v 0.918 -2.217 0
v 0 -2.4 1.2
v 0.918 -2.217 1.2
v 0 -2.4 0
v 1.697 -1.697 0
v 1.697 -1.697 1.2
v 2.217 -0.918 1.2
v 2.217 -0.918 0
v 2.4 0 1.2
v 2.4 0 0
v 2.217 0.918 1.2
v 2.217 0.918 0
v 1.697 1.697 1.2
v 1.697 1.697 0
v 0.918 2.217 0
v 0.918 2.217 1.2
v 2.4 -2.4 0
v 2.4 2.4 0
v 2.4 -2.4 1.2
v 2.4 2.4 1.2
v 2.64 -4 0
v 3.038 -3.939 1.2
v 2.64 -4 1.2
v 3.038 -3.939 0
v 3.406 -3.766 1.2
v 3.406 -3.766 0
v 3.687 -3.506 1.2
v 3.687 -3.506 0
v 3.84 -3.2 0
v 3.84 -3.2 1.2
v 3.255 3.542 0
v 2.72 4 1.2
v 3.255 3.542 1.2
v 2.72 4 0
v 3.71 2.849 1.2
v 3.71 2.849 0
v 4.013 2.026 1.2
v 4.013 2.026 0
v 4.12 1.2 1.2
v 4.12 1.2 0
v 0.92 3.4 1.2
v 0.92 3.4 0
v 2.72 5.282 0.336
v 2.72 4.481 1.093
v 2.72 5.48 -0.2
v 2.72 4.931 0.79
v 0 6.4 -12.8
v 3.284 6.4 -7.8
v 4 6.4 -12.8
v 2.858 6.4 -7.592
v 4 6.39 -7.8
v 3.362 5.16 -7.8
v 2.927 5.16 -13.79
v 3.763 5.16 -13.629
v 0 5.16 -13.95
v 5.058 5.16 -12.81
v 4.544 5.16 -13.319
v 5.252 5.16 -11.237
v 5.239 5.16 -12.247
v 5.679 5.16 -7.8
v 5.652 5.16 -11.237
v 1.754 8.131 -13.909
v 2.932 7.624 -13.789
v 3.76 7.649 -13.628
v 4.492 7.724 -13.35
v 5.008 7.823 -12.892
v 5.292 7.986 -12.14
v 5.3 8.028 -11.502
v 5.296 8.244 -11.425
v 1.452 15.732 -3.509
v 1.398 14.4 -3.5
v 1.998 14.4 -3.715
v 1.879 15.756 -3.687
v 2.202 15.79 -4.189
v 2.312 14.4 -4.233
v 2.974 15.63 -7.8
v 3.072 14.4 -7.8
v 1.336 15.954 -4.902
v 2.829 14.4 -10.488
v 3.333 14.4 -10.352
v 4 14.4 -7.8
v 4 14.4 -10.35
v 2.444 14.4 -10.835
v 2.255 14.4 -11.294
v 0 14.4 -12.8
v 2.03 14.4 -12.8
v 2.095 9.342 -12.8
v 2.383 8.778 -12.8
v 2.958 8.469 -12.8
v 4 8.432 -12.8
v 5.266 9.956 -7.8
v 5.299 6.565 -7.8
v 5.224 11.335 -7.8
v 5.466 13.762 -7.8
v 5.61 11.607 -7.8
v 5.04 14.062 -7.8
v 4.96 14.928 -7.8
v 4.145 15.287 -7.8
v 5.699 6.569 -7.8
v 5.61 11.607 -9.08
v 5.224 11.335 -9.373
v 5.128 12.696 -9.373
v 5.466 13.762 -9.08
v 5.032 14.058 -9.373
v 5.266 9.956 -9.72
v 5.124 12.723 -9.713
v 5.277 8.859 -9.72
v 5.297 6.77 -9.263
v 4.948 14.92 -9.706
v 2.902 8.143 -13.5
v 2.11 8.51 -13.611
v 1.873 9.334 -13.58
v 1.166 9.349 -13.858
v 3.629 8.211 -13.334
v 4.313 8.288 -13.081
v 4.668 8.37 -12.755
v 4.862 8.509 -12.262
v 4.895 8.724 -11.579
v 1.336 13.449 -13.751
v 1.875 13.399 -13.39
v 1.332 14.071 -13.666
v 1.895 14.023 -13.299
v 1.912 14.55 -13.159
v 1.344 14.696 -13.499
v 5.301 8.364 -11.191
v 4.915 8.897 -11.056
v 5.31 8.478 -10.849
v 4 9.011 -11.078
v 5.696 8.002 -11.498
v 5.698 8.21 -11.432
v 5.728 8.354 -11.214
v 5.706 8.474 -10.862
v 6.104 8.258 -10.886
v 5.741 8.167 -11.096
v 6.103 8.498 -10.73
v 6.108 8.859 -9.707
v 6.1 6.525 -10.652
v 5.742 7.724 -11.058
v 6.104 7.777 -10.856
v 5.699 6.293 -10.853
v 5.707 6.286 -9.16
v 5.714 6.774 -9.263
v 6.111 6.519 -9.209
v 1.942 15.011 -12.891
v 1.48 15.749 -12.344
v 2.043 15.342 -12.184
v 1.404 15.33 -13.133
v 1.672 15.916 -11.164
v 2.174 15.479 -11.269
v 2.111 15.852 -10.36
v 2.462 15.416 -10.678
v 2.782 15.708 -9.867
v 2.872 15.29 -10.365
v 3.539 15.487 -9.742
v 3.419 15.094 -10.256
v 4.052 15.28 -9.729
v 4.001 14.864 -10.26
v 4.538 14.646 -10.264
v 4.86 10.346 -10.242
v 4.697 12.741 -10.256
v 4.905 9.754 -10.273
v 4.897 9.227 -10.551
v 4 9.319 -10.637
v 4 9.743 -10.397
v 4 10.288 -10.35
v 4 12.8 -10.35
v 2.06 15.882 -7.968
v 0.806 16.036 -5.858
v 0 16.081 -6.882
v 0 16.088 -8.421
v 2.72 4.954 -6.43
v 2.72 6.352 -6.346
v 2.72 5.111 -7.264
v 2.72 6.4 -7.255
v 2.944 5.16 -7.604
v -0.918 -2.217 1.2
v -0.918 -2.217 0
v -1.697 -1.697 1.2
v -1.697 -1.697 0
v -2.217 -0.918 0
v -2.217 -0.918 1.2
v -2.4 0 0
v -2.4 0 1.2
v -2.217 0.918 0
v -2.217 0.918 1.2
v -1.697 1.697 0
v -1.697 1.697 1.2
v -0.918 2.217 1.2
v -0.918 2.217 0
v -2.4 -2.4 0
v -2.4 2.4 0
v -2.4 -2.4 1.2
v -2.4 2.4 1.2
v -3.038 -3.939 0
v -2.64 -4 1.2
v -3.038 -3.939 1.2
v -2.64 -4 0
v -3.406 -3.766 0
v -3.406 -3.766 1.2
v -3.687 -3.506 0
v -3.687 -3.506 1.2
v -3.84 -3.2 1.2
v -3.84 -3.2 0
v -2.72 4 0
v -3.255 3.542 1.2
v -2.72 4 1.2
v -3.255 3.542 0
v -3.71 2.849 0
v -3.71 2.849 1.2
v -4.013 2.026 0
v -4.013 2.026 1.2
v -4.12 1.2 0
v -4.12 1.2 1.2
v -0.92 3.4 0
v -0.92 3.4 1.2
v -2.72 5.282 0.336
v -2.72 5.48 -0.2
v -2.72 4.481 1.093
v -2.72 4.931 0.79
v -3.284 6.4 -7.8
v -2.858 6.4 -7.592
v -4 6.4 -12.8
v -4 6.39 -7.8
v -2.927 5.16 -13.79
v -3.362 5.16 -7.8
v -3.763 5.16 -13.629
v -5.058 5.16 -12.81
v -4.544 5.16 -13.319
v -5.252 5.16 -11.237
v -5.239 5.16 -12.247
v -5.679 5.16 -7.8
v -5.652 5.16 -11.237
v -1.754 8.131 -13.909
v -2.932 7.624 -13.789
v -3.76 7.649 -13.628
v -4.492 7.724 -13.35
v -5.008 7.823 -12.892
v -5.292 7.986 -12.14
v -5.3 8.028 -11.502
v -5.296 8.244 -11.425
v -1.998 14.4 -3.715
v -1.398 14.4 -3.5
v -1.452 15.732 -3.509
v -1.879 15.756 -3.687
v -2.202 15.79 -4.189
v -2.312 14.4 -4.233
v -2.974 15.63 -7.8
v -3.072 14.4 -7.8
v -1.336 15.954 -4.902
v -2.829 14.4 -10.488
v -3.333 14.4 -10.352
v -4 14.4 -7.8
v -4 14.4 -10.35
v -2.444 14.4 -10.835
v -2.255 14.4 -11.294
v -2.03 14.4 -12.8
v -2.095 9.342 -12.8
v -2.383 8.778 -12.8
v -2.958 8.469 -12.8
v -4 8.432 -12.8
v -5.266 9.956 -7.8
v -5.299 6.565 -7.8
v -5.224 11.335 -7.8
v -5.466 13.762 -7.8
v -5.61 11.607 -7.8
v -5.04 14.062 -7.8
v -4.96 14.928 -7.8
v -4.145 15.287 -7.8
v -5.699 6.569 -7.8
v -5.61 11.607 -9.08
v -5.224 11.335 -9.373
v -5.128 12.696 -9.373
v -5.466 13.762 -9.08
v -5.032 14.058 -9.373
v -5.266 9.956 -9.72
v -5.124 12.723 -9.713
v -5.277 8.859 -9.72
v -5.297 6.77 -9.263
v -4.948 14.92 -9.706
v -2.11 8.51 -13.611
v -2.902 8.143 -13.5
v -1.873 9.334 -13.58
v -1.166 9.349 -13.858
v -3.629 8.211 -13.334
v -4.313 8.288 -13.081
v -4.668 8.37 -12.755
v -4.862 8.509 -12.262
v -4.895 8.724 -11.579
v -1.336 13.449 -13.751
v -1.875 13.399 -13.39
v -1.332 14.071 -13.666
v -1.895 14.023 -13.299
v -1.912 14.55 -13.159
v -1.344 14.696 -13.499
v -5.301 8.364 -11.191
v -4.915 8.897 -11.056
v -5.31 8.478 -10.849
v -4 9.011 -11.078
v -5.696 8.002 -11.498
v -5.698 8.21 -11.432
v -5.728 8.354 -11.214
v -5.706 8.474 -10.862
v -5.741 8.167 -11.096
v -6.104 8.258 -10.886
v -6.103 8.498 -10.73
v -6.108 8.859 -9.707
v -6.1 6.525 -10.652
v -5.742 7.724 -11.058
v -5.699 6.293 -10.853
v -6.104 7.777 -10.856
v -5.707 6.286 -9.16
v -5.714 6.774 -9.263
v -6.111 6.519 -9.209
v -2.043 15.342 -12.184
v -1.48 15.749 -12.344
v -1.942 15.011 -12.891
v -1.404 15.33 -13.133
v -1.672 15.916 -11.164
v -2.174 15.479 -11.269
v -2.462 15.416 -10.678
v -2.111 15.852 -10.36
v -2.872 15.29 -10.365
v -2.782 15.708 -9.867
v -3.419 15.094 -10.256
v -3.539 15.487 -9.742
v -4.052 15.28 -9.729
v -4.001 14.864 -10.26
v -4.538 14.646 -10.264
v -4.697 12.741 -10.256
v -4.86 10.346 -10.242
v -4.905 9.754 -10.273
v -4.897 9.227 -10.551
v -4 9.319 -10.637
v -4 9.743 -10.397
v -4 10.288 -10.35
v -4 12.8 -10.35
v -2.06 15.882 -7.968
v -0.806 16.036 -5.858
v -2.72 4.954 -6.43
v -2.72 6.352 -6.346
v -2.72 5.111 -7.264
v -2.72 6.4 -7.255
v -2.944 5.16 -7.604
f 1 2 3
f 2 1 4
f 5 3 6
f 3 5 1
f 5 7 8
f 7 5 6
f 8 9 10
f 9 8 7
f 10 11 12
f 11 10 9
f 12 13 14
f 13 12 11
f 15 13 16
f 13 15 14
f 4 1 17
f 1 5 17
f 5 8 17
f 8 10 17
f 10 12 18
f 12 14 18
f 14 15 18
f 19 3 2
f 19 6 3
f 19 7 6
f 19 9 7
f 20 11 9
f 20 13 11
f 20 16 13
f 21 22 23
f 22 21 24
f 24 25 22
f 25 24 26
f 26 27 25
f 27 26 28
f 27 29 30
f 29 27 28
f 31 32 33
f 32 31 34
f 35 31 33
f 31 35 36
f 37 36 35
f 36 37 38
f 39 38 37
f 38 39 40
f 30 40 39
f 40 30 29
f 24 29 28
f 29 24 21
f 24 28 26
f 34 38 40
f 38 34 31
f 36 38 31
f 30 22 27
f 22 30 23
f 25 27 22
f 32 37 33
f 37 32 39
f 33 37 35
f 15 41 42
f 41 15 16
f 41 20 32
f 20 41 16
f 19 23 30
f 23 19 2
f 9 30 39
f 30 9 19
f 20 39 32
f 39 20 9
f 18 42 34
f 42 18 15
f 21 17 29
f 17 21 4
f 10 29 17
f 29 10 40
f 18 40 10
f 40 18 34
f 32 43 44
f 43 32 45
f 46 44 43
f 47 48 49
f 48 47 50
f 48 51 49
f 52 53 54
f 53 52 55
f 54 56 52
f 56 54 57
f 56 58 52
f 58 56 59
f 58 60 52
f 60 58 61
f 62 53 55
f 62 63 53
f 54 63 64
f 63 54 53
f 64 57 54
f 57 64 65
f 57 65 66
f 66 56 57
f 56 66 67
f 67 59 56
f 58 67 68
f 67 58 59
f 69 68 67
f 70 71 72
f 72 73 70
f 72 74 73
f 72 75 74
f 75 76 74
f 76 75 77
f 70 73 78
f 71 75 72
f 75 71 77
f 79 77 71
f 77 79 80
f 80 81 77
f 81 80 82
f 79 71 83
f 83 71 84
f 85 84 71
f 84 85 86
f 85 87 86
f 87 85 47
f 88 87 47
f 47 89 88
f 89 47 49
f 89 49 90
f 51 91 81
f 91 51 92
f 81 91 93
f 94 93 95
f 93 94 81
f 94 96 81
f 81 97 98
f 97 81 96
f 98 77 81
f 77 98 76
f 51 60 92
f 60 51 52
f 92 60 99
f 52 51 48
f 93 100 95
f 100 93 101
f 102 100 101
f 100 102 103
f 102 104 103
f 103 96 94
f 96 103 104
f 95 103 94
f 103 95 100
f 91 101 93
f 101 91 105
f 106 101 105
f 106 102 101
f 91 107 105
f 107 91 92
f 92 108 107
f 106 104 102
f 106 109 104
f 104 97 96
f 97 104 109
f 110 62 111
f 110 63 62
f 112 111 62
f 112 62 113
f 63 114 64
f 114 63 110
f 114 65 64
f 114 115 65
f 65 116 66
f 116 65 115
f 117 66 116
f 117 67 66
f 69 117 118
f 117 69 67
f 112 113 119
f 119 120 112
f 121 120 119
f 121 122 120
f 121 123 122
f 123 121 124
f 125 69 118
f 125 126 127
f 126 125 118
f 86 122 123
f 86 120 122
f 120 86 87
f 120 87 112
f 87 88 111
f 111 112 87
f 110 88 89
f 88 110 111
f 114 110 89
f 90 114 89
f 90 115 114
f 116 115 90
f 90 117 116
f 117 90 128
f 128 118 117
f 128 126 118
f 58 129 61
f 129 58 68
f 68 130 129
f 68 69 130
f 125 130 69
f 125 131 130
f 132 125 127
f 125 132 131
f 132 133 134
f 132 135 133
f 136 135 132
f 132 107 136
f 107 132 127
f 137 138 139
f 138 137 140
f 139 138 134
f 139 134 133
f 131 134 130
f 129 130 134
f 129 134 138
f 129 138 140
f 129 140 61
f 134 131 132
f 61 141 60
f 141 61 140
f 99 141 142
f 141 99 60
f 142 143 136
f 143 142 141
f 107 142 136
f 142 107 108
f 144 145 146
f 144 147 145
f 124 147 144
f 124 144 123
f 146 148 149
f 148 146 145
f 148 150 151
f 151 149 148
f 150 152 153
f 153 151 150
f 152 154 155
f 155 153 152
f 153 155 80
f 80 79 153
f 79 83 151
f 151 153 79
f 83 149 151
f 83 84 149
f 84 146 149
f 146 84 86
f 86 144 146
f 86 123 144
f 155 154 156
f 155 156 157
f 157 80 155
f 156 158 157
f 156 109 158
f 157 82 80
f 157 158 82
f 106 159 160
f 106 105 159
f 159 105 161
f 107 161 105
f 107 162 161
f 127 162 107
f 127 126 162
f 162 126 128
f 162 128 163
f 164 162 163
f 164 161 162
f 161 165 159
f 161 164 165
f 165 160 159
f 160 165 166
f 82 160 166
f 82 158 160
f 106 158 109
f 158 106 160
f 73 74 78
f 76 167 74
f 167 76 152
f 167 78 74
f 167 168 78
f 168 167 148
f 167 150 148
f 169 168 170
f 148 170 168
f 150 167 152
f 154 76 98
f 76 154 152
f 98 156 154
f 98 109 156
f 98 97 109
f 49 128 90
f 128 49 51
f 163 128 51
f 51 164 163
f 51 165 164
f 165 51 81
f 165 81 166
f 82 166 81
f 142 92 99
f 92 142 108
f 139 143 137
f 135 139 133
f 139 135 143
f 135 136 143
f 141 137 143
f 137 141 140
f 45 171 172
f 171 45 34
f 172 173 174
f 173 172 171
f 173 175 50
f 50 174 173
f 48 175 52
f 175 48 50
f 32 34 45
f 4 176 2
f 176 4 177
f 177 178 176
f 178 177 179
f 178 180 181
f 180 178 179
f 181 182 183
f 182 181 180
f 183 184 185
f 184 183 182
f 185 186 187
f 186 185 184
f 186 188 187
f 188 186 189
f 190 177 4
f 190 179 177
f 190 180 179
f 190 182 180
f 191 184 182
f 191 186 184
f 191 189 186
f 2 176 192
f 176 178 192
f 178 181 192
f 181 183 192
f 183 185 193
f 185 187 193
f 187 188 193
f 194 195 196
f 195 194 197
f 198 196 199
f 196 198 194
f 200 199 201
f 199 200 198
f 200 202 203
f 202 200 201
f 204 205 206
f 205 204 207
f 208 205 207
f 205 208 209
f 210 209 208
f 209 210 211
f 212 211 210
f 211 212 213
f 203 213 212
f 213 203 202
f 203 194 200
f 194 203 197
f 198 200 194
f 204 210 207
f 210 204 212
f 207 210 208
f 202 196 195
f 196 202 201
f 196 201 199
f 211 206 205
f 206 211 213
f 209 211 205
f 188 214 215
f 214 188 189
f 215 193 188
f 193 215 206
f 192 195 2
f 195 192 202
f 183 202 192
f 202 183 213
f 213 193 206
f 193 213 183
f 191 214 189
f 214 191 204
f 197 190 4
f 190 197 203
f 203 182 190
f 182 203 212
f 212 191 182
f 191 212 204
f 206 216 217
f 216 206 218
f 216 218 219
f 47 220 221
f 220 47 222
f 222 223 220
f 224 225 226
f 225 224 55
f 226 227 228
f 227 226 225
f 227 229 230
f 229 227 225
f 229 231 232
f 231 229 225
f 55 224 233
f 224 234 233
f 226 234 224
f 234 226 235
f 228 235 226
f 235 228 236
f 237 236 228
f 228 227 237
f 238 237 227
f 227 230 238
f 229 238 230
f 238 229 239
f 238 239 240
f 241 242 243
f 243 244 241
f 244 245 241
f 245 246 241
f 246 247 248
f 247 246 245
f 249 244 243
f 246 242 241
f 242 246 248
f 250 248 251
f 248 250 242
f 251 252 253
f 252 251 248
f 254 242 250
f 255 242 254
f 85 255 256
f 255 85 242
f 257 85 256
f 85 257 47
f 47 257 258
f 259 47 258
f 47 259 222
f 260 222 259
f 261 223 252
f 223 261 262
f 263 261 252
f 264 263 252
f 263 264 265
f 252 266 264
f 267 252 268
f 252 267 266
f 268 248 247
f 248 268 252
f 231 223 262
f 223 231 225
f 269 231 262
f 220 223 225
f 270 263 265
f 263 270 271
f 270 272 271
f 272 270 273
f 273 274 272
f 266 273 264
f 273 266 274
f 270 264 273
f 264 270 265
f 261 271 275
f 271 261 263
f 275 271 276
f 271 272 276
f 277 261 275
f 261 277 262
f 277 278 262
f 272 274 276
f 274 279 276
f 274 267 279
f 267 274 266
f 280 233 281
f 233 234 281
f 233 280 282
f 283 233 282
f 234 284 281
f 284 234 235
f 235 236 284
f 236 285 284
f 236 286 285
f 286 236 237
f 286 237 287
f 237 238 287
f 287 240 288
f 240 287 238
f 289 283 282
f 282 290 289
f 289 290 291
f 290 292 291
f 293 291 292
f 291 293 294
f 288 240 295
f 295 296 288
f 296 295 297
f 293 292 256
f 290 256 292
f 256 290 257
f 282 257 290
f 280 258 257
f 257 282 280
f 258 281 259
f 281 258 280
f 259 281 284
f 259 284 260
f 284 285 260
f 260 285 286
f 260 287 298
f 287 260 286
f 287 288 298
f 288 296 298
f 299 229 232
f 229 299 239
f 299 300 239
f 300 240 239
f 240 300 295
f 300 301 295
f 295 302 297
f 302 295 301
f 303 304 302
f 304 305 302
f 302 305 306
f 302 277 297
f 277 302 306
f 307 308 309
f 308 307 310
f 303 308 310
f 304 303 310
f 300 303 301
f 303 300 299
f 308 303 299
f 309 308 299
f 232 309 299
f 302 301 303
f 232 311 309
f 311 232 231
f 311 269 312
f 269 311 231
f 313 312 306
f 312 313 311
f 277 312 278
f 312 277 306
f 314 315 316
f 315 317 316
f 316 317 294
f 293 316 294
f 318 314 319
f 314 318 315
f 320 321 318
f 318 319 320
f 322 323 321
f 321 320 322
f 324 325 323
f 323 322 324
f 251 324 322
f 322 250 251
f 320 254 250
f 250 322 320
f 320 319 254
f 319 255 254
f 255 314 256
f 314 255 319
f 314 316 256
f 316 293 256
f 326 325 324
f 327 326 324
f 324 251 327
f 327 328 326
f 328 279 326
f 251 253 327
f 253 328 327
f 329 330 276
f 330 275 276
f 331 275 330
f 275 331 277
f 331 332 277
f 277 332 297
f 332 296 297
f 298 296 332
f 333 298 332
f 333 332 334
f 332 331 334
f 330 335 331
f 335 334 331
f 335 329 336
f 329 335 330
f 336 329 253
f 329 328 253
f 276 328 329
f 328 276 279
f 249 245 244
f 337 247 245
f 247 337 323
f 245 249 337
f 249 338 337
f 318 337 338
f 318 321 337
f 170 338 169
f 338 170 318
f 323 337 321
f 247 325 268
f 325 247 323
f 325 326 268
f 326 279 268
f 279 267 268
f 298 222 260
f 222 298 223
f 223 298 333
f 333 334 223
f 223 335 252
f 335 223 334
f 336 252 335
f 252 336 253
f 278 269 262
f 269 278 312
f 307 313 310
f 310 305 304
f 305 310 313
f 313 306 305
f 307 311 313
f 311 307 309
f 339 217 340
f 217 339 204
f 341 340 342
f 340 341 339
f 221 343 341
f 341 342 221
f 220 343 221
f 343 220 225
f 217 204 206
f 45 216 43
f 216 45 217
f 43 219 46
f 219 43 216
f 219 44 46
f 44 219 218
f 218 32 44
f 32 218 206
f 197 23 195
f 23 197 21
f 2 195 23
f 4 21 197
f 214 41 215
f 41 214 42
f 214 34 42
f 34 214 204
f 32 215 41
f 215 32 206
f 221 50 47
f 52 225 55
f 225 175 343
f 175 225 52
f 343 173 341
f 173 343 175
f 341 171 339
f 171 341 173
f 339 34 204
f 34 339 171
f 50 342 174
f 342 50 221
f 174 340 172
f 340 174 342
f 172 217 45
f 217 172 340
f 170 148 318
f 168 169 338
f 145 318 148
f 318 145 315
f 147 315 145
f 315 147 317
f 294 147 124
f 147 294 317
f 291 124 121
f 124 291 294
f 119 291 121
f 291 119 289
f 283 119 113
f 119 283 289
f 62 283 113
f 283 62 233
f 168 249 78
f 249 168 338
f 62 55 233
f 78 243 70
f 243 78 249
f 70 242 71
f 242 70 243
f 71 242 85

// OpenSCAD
use <../lib.scad>
use <../p/1-4cylo.scad>
use <../p/rect2p.scad>
use <s/37822s01.scad>
function ldraw_lib__37822() = [
// 0 Minifig Baby Carrier
// 0 Name: 37822.dat
// 0 Author: Philippe Hurbain [Philo]
// 0 !LDRAW_ORG Part UPDATE 2023-04
// 0 !LICENSE Licensed under CC BY 4.0 : see CAreadme.txt
// 
// 0 BFC CERTIFY CCW
  [0,"BFC","CERTIFY"],
  [0,"BFC","CCW"],
// 
// 0 !CATEGORY Minifig Neckwear
// 
// 0 !HISTORY 2023-04-27 {LEGO Instructions App} Original part shape
// 0 !HISTORY 2023-04-30 [Philo] File preparation for LDraw Parts Tracker
// 0 !HISTORY 2023-08-25 [OrionP] Official Update 2023-04
// 
// 
// 1 16 0 0 0 1 0 0 0 1 0 0 0 1 s\37822s01.dat
  [1,16,0,0,0,1,0,0,0,1,0,0,0,1, ldraw_lib__s__37822s01()],
// 1 16 0 0 0 -1 0 0 0 1 0 0 0 1 s\37822s01.dat
  [1,16,0,0,0,-1,0,0,0,1,0,0,0,1, ldraw_lib__s__37822s01()],
// 
// 1 16 6.799 0.5 10.7 0 -13.598 0 0 0 -3.5 3 0 -0.7 1-4cylo.dat
  [1,16,6.799,0.5,10.7,0,-13.598,0,0,0,-3.5,3,0,-0.7, ldraw_lib__1_4cylo()],
// 1 16 0 -1.5 -10 -6.6 0 0 0 0 1.5 0 1 0 rect2p.dat
  [1,16,0,-1.5,-10,-6.6,0,0,0,0,1.5,0,1,0, ldraw_lib__rect2p()],
// 3 16 0 -3 -6 -6.6 -3 -10 6.6 -3 -10
  [3,16,0,-3,-6,-6.6,-3,-10,6.6,-3,-10],
// 3 16 0 0 -6 6.6 0 -10 -6.6 0 -10
  [3,16,0,0,-6,6.6,0,-10,-6.6,0,-10],
// 1 16 0 -1.5 8.5 -2.3 0 0 0 0 1.5 0 1 0 rect2p.dat
  [1,16,0,-1.5,8.5,-2.3,0,0,0,0,1.5,0,1,0, ldraw_lib__rect2p()],
// 4 16 2.3 0 8.5 -2.3 0 8.5 -6.799 0 10 6.799 0 10
  [4,16,2.3,0,8.5,-2.3,0,8.5,-6.799,0,10,6.799,0,10],
// 4 16 -2.3 -3 8.5 2.3 -3 8.5 6.799 -3 10 -6.799 -3 10
  [4,16,-2.3,-3,8.5,2.3,-3,8.5,6.799,-3,10,-6.799,-3,10],
// 3 16 -7.146 18.981 16 7.146 18.981 16 0 32 16
  [3,16,-7.146,18.981,16,7.146,18.981,16,0,32,16],
// 3 16 8.405 19.5 12.9 -8.405 19.5 12.9 0 34.875 12.9
  [3,16,8.405,19.5,12.9,-8.405,19.5,12.9,0,34.875,12.9],
// 4 16 -8.405 19.5 12.9 8.405 19.5 12.9 7.36 19.009 12.9 -7.36 19.009 12.9
  [4,16,-8.405,19.5,12.9,8.405,19.5,12.9,7.36,19.009,12.9,-7.36,19.009,12.9],
// 4 16 -6.799 18.161 12.777 -7.36 19.009 12.9 7.36 19.009 12.9 6.799 18.161 12.777
  [4,16,-6.799,18.161,12.777,-7.36,19.009,12.9,7.36,19.009,12.9,6.799,18.161,12.777],
// 4 16 6.799 16.075 12.384 -6.799 16.075 12.384 -6.799 18.161 12.777 6.799 18.161 12.777
  [4,16,6.799,16.075,12.384,-6.799,16.075,12.384,-6.799,18.161,12.777,6.799,18.161,12.777],
// 4 16 -6.799 16.075 12.384 6.799 16.075 12.384 6.799 0 10 -6.799 0 10
  [4,16,-6.799,16.075,12.384,6.799,16.075,12.384,6.799,0,10,-6.799,0,10],
// 2 24 -6.799 0 10 6.799 0 10
  [2,24,-6.799,0,10,6.799,0,10],
// 4 16 -7.146 18.981 16 -6.799 18.137 16 6.799 18.137 16 7.146 18.981 16
  [4,16,-7.146,18.981,16,-6.799,18.137,16,6.799,18.137,16,7.146,18.981,16],
// 4 16 6.799 18.137 16 -6.799 18.137 16 -6.799 15.866 15.88 6.799 15.866 15.88
  [4,16,6.799,18.137,16,-6.799,18.137,16,-6.799,15.866,15.88,6.799,15.866,15.88],
// 4 16 6.799 0.5 13.7 6.799 15.866 15.88 -6.799 15.866 15.88 -6.8 0.5 13.7
  [4,16,6.799,0.5,13.7,6.799,15.866,15.88,-6.799,15.866,15.88,-6.8,0.5,13.7],
// 5 24 3.51 32.832 38.325 -3.51 32.832 38.325 -3.359 33.748 36.741 -3.699 30.86 39.373
  [5,24,3.51,32.832,38.325,-3.51,32.832,38.325,-3.359,33.748,36.741,-3.699,30.86,39.373],
// 3 16 0 21.052 40.221 4.179 27.911 39.79 -4.179 27.911 39.79
  [3,16,0,21.052,40.221,4.179,27.911,39.79,-4.179,27.911,39.79],
// 3 16 2.016 14.645 40.09 0 17.204 40.203 -2.016 14.645 40.09
  [3,16,2.016,14.645,40.09,0,17.204,40.203,-2.016,14.645,40.09],
// 4 16 4.179 27.911 39.79 3.699 30.86 39.373 -3.699 30.86 39.373 -4.179 27.911 39.79
  [4,16,4.179,27.911,39.79,3.699,30.86,39.373,-3.699,30.86,39.373,-4.179,27.911,39.79],
// 4 16 3.699 30.86 39.373 3.51 32.832 38.325 -3.51 32.832 38.325 -3.699 30.86 39.373
  [4,16,3.699,30.86,39.373,3.51,32.832,38.325,-3.51,32.832,38.325,-3.699,30.86,39.373],
// 4 16 3.51 32.832 38.325 3.359 33.748 36.741 -3.359 33.748 36.741 -3.51 32.832 38.325
  [4,16,3.51,32.832,38.325,3.359,33.748,36.741,-3.359,33.748,36.741,-3.51,32.832,38.325],
// 4 16 3.359 33.748 36.741 3.329 34.166 35.177 -3.329 34.166 35.177 -3.359 33.748 36.741
  [4,16,3.359,33.748,36.741,3.329,34.166,35.177,-3.329,34.166,35.177,-3.359,33.748,36.741],
// 4 16 3.329 34.166 35.177 3.339 34.377 33.623 -3.339 34.377 33.623 -3.329 34.166 35.177
  [4,16,3.329,34.166,35.177,3.339,34.377,33.623,-3.339,34.377,33.623,-3.329,34.166,35.177],
// 4 16 3.339 34.377 33.623 2.916 34.646 23.372 -2.916 34.646 23.372 -3.339 34.377 33.623
  [4,16,3.339,34.377,33.623,2.916,34.646,23.372,-2.916,34.646,23.372,-3.339,34.377,33.623],
// 4 16 2.916 34.646 23.372 4.385 34.772 20.327 -4.385 34.772 20.327 -2.916 34.646 23.372
  [4,16,2.916,34.646,23.372,4.385,34.772,20.327,-4.385,34.772,20.327,-2.916,34.646,23.372],
// 4 16 3.34 12.256 39.884 2.016 14.645 40.09 -2.016 14.645 40.09 -3.34 12.256 39.884
  [4,16,3.34,12.256,39.884,2.016,14.645,40.09,-2.016,14.645,40.09,-3.34,12.256,39.884],
// 5 24 4.179 27.911 39.79 -4.179 27.911 39.79 3.699 30.86 39.373 0 21.052 40.221
  [5,24,4.179,27.911,39.79,-4.179,27.911,39.79,3.699,30.86,39.373,0,21.052,40.221],
// 5 24 3.699 30.86 39.373 -3.699 30.86 39.373 3.51 32.832 38.325 4.179 27.911 39.79
  [5,24,3.699,30.86,39.373,-3.699,30.86,39.373,3.51,32.832,38.325,4.179,27.911,39.79],
// 5 24 3.359 33.748 36.741 -3.359 33.748 36.741 3.329 34.166 35.177 3.51 32.832 38.325
  [5,24,3.359,33.748,36.741,-3.359,33.748,36.741,3.329,34.166,35.177,3.51,32.832,38.325],
// 5 24 3.329 34.166 35.177 -3.329 34.166 35.177 3.339 34.377 33.623 3.359 33.748 36.741
  [5,24,3.329,34.166,35.177,-3.329,34.166,35.177,3.339,34.377,33.623,3.359,33.748,36.741],
// 5 24 3.339 34.377 33.623 -3.339 34.377 33.623 2.916 34.646 23.372 3.329 34.166 35.177
  [5,24,3.339,34.377,33.623,-3.339,34.377,33.623,2.916,34.646,23.372,3.329,34.166,35.177],
// 5 24 2.916 34.646 23.372 -2.916 34.646 23.372 4.385 34.772 20.327 3.339 34.377 33.623
  [5,24,2.916,34.646,23.372,-2.916,34.646,23.372,4.385,34.772,20.327,3.339,34.377,33.623],
// 5 24 2.016 14.645 40.09 -2.016 14.645 40.09 0 17.204 40.203 3.34 12.256 39.884
  [5,24,2.016,14.645,40.09,-2.016,14.645,40.09,0,17.204,40.203,3.34,12.256,39.884],
// 3 16 4.385 34.772 20.327 0 34.875 12.9 -4.385 34.772 20.327
  [3,16,4.385,34.772,20.327,0,34.875,12.9,-4.385,34.772,20.327],
// 4 16 3.34 12.256 39.884 -3.34 12.256 39.884 -3.629 8.772 39.33 3.629 8.772 39.33
  [4,16,3.34,12.256,39.884,-3.34,12.256,39.884,-3.629,8.772,39.33,3.629,8.772,39.33],
// 4 16 3.494 8.75 36 3.629 8.772 39.33 -3.629 8.772 39.33 -3.494 8.75 36
  [4,16,3.494,8.75,36,3.629,8.772,39.33,-3.629,8.772,39.33,-3.494,8.75,36],
// 2 24 -3.629 8.772 39.33 3.629 8.772 39.33
  [2,24,-3.629,8.772,39.33,3.629,8.772,39.33],
// 2 24 -3.494 8.75 36 3.494 8.75 36
  [2,24,-3.494,8.75,36,3.494,8.75,36],
// 3 16 3.494 8.75 36 -3.494 8.75 36 0 32 36
  [3,16,3.494,8.75,36,-3.494,8.75,36,0,32,36],
// 5 24 3.629 8.772 39.33 3.494 8.75 36 4.994 9.288 36 -3.629 8.772 39.33
  [5,24,3.629,8.772,39.33,3.494,8.75,36,4.994,9.288,36,-3.629,8.772,39.33],
// 5 24 -3.34 12.256 39.884 3.34 12.256 39.884 2.016 14.645 40.09 -3.629 8.772 39.33
  [5,24,-3.34,12.256,39.884,3.34,12.256,39.884,2.016,14.645,40.09,-3.629,8.772,39.33],
// 5 24 0 34.875 12.9 -4.385 34.772 20.327 -7.318 34.474 12.9 4.385 34.772 20.327
  [5,24,0,34.875,12.9,-4.385,34.772,20.327,-7.318,34.474,12.9,4.385,34.772,20.327],
// 5 24 7.36 19.009 12.9 -7.36 19.009 12.9 6.799 18.161 12.777 -8.405 19.5 12.9
  [5,24,7.36,19.009,12.9,-7.36,19.009,12.9,6.799,18.161,12.777,-8.405,19.5,12.9],
// 5 24 6.799 16.075 12.384 -6.799 16.075 12.384 -6.799 18.161 12.777 6.799 0 10
  [5,24,6.799,16.075,12.384,-6.799,16.075,12.384,-6.799,18.161,12.777,6.799,0,10],
// 5 24 -3.34 12.256 39.884 -3.629 8.772 39.33 3.629 8.772 39.33 -4.697 9.217 39.391
  [5,24,-3.34,12.256,39.884,-3.629,8.772,39.33,3.629,8.772,39.33,-4.697,9.217,39.391],
// 5 24 -6.799 15.866 15.88 6.799 15.866 15.88 6.799 18.137 16 -6.8 0.5 13.7
  [5,24,-6.799,15.866,15.88,6.799,15.866,15.88,6.799,18.137,16,-6.8,0.5,13.7],
// 5 24 6.799 18.161 12.777 -6.799 18.161 12.777 6.799 16.075 12.384 -7.36 19.009 12.9
  [5,24,6.799,18.161,12.777,-6.799,18.161,12.777,6.799,16.075,12.384,-7.36,19.009,12.9],
// 5 24 -3.629 8.772 39.33 -3.494 8.75 36 -4.994 9.288 36 3.494 8.75 36
  [5,24,-3.629,8.772,39.33,-3.494,8.75,36,-4.994,9.288,36,3.494,8.75,36],
// 5 24 4.385 34.772 20.327 0 34.875 12.9 7.318 34.474 12.9 -4.385 34.772 20.327
  [5,24,4.385,34.772,20.327,0,34.875,12.9,7.318,34.474,12.9,-4.385,34.772,20.327],
// 5 24 3.34 12.256 39.884 3.629 8.772 39.33 -3.34 12.256 39.884 4.697 9.217 39.391
  [5,24,3.34,12.256,39.884,3.629,8.772,39.33,-3.34,12.256,39.884,4.697,9.217,39.391],
// 5 24 -6.799 18.137 16 6.799 18.137 16 7.146 18.981 16 -6.799 15.866 15.88
  [5,24,-6.799,18.137,16,6.799,18.137,16,7.146,18.981,16,-6.799,15.866,15.88],
// 5 24 -4.385 34.772 20.327 4.385 34.772 20.327 -2.916 34.646 23.372 0 34.875 12.9
  [5,24,-4.385,34.772,20.327,4.385,34.772,20.327,-2.916,34.646,23.372,0,34.875,12.9],
// 5 24 -6.8 0.5 13.7 6.799 0.5 13.7 6.799 15.866 15.88 -6.799 -0.8395 13.2038
  [5,24,-6.8,0.5,13.7,6.799,0.5,13.7,6.799,15.866,15.88,-6.799,-0.8395,13.2038],
// 5 24 9.6 -3 -8 9.6 0 -8 10.299 -3 3 9.2184 -3 -8.7654
  [5,24,9.6,-3,-8,9.6,0,-8,10.299,-3,3,9.2184,-3,-8.7654],
// 5 24 10.299 0 3 10.299 -3 3 9.6 -3 -8 10.0327 -3 5.0657
  [5,24,10.299,0,3,10.299,-3,3,9.6,-3,-8,10.0327,-3,5.0657],
// 5 24 -9.6 0 -8 -9.6 -3 -8 -10.299 -3 3 -9.2184 -3 -8.7654
  [5,24,-9.6,0,-8,-9.6,-3,-8,-10.299,-3,3,-9.2184,-3,-8.7654],
// 5 24 -10.299 -3 3 -10.299 0 3 -9.6 0 -8 -10.0327 -3 5.0657
  [5,24,-10.299,-3,3,-10.299,0,3,-9.6,0,-8,-10.0327,-3,5.0657],
// 
// 5 24 0 17.204 40.203 0 21.052 40.221 2.016 14.645 40.09 -2.016 14.645 40.09
  [5,24,0,17.204,40.203,0,21.052,40.221,2.016,14.645,40.09,-2.016,14.645,40.09],
];
module ldraw_lib__37822(step=0, col=false, unit=2/5, alt=false, line=0.2, solid=!$preview)
    makepoly(ldraw_lib__37822(), step=step, col=col, unit=unit, alt=alt, line=line, solid=solid);
ldraw_lib__37822(line=0.2);
